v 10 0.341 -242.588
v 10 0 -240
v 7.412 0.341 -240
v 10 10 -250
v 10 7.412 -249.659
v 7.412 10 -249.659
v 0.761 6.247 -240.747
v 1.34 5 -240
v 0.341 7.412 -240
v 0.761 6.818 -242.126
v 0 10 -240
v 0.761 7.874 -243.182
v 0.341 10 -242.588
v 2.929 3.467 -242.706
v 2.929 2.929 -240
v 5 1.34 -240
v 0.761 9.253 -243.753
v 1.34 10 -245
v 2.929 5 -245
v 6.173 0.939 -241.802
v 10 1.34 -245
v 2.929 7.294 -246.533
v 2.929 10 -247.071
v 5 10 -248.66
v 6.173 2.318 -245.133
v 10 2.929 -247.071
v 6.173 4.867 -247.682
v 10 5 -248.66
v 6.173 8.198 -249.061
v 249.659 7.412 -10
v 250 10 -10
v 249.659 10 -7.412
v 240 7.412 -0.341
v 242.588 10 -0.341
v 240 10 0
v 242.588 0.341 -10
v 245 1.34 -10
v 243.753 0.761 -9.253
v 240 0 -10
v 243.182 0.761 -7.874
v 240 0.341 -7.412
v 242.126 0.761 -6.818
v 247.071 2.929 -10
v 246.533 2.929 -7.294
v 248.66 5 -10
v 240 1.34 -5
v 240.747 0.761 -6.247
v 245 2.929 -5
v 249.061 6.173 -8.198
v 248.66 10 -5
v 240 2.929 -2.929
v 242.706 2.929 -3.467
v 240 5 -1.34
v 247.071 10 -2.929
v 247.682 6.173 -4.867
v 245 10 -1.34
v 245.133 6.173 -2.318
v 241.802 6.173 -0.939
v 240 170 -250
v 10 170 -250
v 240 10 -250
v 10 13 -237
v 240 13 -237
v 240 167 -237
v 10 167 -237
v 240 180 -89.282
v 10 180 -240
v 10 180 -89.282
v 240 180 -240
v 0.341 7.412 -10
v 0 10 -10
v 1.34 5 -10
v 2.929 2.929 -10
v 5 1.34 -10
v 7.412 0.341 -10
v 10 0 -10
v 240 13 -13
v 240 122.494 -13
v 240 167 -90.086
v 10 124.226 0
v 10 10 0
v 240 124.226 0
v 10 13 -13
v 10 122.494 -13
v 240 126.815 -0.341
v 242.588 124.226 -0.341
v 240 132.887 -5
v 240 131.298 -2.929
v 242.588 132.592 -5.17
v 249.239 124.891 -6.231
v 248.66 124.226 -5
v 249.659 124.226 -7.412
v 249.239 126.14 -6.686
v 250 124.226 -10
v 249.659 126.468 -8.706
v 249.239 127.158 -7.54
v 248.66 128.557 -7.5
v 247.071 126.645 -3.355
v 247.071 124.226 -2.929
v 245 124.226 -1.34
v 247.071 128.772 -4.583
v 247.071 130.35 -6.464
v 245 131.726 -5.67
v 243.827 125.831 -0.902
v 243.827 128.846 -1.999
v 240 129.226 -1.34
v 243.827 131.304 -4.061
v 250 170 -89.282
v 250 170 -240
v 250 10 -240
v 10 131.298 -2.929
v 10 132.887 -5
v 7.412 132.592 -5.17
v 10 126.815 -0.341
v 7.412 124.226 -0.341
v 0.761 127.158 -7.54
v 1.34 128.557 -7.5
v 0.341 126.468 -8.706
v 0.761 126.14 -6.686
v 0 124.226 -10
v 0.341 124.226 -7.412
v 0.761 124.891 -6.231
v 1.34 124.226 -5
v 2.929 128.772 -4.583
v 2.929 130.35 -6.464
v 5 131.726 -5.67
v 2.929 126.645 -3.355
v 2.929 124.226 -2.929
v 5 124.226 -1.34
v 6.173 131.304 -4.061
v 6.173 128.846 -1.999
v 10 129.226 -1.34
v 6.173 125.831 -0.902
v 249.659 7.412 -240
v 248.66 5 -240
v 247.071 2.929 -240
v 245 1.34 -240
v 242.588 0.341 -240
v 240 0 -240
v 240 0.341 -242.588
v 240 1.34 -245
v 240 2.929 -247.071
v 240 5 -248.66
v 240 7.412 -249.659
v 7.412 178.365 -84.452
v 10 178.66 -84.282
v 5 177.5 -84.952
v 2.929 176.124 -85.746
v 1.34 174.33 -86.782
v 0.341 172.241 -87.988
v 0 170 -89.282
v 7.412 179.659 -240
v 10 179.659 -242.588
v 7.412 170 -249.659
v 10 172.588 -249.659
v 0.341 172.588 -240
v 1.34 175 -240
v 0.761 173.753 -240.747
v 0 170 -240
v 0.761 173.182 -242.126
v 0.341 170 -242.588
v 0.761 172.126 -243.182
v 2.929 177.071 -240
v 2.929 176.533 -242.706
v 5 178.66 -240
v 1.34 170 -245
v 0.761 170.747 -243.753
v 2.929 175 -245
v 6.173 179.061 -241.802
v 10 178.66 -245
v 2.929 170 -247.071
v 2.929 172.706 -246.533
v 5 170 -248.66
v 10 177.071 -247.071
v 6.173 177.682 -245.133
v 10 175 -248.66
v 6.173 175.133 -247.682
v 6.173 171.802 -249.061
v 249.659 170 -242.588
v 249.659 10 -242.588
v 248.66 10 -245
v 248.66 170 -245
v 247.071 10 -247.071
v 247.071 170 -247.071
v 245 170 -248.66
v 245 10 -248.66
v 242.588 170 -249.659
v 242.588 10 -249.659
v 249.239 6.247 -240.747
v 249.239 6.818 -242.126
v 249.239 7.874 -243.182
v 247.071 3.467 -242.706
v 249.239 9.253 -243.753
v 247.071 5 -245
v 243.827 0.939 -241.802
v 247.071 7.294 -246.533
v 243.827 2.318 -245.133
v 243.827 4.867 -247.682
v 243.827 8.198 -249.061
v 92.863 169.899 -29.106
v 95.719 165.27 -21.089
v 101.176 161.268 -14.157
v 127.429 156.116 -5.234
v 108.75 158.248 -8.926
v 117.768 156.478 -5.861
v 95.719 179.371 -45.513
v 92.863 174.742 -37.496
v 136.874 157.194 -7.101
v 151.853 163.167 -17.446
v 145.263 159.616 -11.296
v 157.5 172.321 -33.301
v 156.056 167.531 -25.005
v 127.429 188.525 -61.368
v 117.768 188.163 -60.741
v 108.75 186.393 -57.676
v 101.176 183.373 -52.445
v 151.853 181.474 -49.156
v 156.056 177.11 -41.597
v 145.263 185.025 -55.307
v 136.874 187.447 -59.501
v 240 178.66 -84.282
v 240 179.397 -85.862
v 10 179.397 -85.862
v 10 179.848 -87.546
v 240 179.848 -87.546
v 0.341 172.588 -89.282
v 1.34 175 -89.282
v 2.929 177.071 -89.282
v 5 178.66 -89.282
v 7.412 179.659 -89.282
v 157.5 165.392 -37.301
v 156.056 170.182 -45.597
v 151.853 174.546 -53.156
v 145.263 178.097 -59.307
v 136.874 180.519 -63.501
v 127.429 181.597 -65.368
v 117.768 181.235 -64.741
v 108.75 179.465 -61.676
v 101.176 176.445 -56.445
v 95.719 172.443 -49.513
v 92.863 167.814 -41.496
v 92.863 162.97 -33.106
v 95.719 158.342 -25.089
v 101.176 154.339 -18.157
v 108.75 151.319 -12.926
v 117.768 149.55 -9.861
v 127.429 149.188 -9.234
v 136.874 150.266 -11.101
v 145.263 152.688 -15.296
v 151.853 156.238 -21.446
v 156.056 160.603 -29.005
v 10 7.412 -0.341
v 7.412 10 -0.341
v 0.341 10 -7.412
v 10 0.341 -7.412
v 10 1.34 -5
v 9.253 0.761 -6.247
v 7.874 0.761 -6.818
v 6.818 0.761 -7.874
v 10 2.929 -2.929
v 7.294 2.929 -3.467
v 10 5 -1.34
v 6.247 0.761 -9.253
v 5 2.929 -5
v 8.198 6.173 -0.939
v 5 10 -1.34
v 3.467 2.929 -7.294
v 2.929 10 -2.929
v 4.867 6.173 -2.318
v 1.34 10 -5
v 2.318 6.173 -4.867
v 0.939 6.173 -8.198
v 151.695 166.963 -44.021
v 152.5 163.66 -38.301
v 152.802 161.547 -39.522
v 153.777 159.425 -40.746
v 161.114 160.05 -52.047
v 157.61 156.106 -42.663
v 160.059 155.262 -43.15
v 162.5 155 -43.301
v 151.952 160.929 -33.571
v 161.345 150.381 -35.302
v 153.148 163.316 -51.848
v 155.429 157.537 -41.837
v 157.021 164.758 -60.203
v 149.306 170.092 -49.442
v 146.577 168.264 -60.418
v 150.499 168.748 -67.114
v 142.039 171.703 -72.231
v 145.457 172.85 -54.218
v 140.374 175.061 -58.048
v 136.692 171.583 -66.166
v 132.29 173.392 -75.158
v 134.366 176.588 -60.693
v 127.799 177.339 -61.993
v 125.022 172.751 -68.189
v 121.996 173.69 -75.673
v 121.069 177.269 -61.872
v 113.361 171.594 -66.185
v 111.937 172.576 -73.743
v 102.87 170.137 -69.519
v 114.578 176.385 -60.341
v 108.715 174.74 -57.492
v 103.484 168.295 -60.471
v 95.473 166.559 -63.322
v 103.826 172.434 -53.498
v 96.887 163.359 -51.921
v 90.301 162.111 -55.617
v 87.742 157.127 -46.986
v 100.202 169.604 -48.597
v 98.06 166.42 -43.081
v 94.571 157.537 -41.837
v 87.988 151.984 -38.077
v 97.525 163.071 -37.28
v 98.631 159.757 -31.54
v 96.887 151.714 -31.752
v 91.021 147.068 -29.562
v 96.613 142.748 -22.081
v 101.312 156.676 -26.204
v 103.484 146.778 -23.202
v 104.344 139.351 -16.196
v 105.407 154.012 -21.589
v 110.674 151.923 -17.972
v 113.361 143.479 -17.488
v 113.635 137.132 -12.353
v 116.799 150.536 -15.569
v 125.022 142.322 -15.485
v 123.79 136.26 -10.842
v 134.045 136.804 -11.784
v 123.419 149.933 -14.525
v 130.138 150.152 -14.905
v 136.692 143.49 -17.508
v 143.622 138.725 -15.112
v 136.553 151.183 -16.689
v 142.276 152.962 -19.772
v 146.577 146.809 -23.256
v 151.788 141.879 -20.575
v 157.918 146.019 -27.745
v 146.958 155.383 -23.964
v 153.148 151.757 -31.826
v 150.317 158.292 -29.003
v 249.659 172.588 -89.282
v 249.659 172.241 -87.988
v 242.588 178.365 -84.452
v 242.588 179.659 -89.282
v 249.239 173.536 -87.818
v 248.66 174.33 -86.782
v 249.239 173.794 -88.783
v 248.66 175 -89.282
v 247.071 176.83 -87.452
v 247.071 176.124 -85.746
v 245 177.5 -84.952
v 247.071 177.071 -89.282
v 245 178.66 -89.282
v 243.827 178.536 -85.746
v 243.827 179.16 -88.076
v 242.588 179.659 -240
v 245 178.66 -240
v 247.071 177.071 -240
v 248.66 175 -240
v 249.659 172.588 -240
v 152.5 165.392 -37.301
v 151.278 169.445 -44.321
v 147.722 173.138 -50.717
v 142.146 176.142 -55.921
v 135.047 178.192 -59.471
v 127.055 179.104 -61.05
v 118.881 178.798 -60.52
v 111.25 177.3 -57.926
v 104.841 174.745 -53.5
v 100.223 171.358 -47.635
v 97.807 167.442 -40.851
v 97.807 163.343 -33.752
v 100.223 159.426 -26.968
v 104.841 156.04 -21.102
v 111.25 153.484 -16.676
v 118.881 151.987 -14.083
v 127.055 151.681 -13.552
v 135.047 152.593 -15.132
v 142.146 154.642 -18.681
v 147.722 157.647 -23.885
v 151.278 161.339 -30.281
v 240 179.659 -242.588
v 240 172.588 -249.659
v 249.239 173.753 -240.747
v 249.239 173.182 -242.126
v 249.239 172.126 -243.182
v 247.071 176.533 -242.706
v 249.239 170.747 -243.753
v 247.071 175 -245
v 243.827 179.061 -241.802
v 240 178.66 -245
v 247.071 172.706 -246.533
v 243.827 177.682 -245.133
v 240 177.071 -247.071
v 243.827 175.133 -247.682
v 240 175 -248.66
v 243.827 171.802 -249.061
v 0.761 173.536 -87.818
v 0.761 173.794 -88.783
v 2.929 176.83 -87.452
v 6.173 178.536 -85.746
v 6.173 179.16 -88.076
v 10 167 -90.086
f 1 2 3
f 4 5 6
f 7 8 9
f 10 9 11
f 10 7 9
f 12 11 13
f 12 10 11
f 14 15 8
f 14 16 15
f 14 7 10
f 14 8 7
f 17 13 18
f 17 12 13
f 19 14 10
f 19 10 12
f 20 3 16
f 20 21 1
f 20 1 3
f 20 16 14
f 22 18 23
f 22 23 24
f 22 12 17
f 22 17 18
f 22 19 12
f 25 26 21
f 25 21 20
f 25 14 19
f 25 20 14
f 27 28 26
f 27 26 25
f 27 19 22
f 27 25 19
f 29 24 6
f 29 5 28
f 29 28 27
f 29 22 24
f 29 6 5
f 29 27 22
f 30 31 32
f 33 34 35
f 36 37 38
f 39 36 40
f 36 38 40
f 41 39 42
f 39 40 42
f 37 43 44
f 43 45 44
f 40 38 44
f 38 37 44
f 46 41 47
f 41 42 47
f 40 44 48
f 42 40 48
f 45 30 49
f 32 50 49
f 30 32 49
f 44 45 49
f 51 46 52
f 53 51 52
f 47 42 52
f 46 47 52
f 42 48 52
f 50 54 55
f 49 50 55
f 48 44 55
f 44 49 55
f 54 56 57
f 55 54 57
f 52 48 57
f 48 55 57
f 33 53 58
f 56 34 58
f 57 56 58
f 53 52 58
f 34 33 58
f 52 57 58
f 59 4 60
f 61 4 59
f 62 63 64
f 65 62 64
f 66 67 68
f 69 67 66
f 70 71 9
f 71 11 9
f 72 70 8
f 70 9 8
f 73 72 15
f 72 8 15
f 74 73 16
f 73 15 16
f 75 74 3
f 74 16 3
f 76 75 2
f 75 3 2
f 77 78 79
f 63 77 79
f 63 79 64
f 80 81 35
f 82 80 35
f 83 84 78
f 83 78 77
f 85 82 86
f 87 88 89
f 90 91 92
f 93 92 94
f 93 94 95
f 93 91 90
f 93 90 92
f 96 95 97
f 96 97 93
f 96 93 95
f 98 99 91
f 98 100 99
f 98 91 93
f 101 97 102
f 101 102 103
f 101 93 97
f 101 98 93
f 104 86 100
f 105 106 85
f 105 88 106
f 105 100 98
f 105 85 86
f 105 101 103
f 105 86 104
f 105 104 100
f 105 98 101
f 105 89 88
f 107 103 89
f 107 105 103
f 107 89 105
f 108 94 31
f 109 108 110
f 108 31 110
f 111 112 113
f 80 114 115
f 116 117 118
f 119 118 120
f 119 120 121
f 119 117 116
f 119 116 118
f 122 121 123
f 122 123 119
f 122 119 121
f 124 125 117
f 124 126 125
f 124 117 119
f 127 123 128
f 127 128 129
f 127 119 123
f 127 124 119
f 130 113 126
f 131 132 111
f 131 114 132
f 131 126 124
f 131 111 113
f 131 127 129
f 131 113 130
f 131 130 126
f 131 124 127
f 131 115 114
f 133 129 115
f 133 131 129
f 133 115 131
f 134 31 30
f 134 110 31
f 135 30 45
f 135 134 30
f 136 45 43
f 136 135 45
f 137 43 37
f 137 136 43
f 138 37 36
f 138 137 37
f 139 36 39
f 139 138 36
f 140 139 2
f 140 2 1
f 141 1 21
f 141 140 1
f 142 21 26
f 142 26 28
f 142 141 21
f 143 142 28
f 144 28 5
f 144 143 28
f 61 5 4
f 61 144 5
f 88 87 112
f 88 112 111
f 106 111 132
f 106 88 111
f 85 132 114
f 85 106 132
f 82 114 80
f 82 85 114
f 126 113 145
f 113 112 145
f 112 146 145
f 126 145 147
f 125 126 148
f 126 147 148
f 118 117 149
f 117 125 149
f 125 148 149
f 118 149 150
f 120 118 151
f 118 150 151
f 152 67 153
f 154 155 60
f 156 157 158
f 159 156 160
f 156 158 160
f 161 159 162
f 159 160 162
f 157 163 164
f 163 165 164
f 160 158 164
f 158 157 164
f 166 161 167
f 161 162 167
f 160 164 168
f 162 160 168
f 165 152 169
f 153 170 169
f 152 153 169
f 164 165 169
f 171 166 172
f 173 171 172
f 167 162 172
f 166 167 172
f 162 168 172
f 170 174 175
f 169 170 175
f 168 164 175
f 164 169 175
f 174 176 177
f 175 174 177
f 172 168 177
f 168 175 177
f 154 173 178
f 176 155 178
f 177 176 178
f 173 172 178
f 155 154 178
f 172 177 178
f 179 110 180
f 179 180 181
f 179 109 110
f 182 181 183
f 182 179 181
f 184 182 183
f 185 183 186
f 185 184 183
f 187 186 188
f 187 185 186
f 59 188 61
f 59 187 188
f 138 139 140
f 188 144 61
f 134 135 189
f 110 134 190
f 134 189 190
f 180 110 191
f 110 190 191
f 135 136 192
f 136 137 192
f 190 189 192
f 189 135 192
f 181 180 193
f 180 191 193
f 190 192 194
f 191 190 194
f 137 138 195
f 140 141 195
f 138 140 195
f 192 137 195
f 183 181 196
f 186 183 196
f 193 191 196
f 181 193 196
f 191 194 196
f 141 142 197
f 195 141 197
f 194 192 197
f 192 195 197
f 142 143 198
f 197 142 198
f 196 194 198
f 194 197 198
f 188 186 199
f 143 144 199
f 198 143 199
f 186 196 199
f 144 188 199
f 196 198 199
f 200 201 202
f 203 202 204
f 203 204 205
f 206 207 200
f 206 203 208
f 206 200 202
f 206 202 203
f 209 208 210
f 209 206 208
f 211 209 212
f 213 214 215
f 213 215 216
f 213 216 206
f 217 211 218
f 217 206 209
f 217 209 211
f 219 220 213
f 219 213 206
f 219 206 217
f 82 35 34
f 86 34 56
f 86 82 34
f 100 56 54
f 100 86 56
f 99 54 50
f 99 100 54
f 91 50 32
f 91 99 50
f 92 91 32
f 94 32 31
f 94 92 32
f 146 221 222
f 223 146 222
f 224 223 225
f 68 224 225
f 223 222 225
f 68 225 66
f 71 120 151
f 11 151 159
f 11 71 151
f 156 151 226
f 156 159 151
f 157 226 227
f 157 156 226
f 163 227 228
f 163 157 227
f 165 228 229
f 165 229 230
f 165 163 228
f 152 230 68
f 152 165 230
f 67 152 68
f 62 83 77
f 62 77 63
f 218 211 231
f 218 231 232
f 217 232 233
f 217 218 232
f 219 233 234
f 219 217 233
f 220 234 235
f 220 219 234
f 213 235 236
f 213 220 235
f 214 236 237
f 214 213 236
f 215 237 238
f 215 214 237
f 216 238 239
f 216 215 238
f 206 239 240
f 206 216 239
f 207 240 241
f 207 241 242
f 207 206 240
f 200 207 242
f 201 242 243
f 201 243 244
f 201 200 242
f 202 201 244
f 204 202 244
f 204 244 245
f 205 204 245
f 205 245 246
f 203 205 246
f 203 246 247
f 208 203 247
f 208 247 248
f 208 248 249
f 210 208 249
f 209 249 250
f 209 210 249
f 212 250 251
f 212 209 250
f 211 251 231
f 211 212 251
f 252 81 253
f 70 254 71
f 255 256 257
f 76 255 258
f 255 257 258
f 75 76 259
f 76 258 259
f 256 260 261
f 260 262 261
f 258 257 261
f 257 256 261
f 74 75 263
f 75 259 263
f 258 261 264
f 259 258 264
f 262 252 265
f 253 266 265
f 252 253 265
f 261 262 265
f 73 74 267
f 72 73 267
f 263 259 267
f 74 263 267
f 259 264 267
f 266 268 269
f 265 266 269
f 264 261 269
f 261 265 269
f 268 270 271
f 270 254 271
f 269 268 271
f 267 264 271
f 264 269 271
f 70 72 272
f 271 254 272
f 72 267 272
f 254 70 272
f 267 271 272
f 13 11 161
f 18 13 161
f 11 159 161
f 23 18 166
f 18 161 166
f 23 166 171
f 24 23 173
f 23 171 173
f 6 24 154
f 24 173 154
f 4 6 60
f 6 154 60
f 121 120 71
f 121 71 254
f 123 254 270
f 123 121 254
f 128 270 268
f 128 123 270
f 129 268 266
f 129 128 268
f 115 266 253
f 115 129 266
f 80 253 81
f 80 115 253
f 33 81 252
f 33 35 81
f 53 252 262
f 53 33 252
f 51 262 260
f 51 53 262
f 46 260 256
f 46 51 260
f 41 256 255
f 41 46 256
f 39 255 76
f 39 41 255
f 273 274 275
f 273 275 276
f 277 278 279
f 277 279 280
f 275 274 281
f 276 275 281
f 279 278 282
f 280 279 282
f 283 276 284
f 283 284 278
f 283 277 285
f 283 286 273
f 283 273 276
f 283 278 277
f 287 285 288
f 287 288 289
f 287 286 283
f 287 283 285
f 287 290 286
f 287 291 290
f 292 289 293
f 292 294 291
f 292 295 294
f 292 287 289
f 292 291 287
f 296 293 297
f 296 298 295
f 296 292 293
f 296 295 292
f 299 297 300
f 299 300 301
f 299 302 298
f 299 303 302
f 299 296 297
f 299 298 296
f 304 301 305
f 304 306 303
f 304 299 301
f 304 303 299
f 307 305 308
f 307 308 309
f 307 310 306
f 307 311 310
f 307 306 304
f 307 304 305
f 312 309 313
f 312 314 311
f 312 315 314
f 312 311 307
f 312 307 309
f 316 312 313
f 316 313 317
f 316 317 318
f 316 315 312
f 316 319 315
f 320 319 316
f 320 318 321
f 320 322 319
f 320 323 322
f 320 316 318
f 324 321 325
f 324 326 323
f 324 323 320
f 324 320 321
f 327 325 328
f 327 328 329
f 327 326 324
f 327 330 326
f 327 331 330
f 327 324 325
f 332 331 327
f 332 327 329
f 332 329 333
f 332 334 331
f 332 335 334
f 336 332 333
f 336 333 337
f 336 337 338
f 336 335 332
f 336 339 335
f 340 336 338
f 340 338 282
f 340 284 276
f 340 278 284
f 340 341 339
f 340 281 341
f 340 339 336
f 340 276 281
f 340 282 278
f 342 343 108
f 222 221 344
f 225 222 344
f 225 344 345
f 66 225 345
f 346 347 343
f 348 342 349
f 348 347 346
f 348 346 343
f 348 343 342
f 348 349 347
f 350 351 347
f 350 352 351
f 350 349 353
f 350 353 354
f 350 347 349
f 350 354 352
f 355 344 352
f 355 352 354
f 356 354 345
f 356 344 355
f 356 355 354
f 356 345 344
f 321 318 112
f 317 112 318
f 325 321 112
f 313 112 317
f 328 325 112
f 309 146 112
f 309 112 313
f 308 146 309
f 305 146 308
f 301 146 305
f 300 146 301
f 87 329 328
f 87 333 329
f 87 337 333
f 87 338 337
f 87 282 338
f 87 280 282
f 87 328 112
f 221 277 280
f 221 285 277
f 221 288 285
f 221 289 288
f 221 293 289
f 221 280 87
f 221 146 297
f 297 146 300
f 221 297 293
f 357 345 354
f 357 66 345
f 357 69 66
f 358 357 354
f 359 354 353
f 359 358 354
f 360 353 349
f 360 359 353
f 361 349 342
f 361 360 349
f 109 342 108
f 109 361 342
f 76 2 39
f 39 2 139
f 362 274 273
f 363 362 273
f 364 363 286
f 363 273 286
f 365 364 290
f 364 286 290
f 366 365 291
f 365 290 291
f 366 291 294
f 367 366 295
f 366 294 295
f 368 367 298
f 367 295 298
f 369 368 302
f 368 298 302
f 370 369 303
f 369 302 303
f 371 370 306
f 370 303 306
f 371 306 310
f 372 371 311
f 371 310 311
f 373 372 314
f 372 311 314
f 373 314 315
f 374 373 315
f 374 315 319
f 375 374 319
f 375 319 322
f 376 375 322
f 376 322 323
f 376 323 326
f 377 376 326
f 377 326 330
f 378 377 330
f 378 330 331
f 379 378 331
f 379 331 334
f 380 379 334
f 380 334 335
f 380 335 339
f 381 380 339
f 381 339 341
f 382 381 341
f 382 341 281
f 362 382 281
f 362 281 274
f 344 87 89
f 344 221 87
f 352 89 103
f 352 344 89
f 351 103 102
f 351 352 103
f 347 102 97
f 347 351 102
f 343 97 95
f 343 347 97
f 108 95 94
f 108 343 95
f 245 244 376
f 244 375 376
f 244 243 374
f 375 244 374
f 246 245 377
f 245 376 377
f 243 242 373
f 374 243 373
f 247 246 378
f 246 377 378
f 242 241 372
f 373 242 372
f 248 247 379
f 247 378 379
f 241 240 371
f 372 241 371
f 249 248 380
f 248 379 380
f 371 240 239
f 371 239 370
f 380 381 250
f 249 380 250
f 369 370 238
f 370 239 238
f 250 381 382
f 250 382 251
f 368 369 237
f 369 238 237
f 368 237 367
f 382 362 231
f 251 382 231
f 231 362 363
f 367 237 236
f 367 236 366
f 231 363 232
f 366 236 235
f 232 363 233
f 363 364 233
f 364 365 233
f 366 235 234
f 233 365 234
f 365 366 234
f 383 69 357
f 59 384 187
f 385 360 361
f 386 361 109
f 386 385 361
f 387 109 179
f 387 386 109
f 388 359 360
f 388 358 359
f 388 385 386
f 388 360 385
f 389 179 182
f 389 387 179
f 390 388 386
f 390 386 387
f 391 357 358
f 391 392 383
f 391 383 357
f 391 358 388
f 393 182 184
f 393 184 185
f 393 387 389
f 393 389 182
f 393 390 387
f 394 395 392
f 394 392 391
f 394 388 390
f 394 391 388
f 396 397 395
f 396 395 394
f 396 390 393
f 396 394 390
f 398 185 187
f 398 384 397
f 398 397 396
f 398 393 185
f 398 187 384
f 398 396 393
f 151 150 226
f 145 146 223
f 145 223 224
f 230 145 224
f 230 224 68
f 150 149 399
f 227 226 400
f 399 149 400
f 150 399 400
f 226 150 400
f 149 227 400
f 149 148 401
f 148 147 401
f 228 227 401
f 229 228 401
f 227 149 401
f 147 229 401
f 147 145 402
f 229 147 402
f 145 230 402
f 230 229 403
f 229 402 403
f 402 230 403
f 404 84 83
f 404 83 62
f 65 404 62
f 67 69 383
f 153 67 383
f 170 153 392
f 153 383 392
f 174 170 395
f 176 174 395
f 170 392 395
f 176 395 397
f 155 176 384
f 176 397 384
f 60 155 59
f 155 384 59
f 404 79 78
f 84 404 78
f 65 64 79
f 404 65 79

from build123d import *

# Parameters (mm, degrees)
SKETCH_1_W          = 250
SKETCH_1_H          = 250
EXTRUDE_1_DEPTH     = 180
CHAMFER_1_SIZE      = 50
CHAMFER_1_SIZE2     = 86.602540378
SKETCH_2_R          = 27.5
EXTRUDE_2_DEPTH     = 20
EXTRUDE_START       = 12
SKETCH_2_3_R        = 32.5
SKETCH_2_3_R_2      = 27.5
EXTRUDE_3_DEPTH     = 8
FILLET_1_R          = 10
CUT_EXTRUDE_START   = -10
CUT_EXTRUDE_1_DEPTH = 230


with BuildPart() as part:
    # 스케치1 → 보스-돌출1 (new body)
    with BuildSketch(Plane(origin=(0, 0, 0), x_dir=(1, 0, 0), z_dir=(0, 1, 0))):
        with Locations((125, 125)):
            Rectangle(SKETCH_1_W, SKETCH_1_H)
    extrude(amount=EXTRUDE_1_DEPTH)

    # 모따기1
    chamfer_1_edges = [part.edges().sort_by_distance(p)[0] for p in [
        (125, 180, 0),
    ]]
    chamfer_1_side = [part.faces().sort_by_distance(p)[0] for p in [
        (125, 90, 0),
    ]]
    chamfer(chamfer_1_edges, length=CHAMFER_1_SIZE, length2=CHAMFER_1_SIZE2, reference=chamfer_1_side[0])

    # 스케치2 → 보스-돌출2 (add)
    with BuildSketch(Plane(origin=(0, 97.5, 56.291651246), x_dir=(1, 0, 0), z_dir=(0, 0.8660254037844379, 0.5000000000000014))):
        with Locations((125, 115)):
            Circle(SKETCH_2_R)
    extrude(amount=EXTRUDE_2_DEPTH)

    # 스케치2<3> → 보스-돌출3 (add)
    with BuildSketch(Plane(origin=(0, 97.5, 56.291651246), x_dir=(1, 0, 0), z_dir=(0, 0.8660254037844379, 0.5000000000000014)).offset(EXTRUDE_START)):
        with Locations((125, 115)):
            Circle(SKETCH_2_3_R)
        with Locations((125, 115)):
            Circle(SKETCH_2_3_R_2, mode=Mode.SUBTRACT)
    extrude(amount=EXTRUDE_3_DEPTH)

    # 필렛1
    fillet_1_edges = [part.edges().sort_by_distance(p)[0] for p in [
        (97.5, 155, -43.301270189),
        (125, 180, -86.602540378),
        (0, 180, -168.301270189),
        (0, 155, -43.301270189),
        (125, 180, -250),
        (0, 90, -250),
        (250, 90, -250),
        (250, 155, -43.301270189),
        (250, 180, -168.301270189),
        (0, 65, 0),
        (125, 130, 0),
        (250, 65, 0),
        (125, 0, 0),
        (250, 0, -125),
        (125, 0, -250),
        (0, 0, -125),
    ]]
    fillet(fillet_1_edges, radius=FILLET_1_R)

    # 스케치3 → 컷-돌출1 (cut)
    with BuildSketch(Plane(origin=(250, 0, 0), x_dir=(0, 0, -1), z_dir=(1, 0, 0)).offset(CUT_EXTRUDE_START)):
        Polygon((237, 13), (237, 167), (90.08587988, 167), (13, 122.494446501), (13, 13), align=None)
    extrude(amount=-CUT_EXTRUDE_1_DEPTH, mode=Mode.SUBTRACT)


solid = part.part
